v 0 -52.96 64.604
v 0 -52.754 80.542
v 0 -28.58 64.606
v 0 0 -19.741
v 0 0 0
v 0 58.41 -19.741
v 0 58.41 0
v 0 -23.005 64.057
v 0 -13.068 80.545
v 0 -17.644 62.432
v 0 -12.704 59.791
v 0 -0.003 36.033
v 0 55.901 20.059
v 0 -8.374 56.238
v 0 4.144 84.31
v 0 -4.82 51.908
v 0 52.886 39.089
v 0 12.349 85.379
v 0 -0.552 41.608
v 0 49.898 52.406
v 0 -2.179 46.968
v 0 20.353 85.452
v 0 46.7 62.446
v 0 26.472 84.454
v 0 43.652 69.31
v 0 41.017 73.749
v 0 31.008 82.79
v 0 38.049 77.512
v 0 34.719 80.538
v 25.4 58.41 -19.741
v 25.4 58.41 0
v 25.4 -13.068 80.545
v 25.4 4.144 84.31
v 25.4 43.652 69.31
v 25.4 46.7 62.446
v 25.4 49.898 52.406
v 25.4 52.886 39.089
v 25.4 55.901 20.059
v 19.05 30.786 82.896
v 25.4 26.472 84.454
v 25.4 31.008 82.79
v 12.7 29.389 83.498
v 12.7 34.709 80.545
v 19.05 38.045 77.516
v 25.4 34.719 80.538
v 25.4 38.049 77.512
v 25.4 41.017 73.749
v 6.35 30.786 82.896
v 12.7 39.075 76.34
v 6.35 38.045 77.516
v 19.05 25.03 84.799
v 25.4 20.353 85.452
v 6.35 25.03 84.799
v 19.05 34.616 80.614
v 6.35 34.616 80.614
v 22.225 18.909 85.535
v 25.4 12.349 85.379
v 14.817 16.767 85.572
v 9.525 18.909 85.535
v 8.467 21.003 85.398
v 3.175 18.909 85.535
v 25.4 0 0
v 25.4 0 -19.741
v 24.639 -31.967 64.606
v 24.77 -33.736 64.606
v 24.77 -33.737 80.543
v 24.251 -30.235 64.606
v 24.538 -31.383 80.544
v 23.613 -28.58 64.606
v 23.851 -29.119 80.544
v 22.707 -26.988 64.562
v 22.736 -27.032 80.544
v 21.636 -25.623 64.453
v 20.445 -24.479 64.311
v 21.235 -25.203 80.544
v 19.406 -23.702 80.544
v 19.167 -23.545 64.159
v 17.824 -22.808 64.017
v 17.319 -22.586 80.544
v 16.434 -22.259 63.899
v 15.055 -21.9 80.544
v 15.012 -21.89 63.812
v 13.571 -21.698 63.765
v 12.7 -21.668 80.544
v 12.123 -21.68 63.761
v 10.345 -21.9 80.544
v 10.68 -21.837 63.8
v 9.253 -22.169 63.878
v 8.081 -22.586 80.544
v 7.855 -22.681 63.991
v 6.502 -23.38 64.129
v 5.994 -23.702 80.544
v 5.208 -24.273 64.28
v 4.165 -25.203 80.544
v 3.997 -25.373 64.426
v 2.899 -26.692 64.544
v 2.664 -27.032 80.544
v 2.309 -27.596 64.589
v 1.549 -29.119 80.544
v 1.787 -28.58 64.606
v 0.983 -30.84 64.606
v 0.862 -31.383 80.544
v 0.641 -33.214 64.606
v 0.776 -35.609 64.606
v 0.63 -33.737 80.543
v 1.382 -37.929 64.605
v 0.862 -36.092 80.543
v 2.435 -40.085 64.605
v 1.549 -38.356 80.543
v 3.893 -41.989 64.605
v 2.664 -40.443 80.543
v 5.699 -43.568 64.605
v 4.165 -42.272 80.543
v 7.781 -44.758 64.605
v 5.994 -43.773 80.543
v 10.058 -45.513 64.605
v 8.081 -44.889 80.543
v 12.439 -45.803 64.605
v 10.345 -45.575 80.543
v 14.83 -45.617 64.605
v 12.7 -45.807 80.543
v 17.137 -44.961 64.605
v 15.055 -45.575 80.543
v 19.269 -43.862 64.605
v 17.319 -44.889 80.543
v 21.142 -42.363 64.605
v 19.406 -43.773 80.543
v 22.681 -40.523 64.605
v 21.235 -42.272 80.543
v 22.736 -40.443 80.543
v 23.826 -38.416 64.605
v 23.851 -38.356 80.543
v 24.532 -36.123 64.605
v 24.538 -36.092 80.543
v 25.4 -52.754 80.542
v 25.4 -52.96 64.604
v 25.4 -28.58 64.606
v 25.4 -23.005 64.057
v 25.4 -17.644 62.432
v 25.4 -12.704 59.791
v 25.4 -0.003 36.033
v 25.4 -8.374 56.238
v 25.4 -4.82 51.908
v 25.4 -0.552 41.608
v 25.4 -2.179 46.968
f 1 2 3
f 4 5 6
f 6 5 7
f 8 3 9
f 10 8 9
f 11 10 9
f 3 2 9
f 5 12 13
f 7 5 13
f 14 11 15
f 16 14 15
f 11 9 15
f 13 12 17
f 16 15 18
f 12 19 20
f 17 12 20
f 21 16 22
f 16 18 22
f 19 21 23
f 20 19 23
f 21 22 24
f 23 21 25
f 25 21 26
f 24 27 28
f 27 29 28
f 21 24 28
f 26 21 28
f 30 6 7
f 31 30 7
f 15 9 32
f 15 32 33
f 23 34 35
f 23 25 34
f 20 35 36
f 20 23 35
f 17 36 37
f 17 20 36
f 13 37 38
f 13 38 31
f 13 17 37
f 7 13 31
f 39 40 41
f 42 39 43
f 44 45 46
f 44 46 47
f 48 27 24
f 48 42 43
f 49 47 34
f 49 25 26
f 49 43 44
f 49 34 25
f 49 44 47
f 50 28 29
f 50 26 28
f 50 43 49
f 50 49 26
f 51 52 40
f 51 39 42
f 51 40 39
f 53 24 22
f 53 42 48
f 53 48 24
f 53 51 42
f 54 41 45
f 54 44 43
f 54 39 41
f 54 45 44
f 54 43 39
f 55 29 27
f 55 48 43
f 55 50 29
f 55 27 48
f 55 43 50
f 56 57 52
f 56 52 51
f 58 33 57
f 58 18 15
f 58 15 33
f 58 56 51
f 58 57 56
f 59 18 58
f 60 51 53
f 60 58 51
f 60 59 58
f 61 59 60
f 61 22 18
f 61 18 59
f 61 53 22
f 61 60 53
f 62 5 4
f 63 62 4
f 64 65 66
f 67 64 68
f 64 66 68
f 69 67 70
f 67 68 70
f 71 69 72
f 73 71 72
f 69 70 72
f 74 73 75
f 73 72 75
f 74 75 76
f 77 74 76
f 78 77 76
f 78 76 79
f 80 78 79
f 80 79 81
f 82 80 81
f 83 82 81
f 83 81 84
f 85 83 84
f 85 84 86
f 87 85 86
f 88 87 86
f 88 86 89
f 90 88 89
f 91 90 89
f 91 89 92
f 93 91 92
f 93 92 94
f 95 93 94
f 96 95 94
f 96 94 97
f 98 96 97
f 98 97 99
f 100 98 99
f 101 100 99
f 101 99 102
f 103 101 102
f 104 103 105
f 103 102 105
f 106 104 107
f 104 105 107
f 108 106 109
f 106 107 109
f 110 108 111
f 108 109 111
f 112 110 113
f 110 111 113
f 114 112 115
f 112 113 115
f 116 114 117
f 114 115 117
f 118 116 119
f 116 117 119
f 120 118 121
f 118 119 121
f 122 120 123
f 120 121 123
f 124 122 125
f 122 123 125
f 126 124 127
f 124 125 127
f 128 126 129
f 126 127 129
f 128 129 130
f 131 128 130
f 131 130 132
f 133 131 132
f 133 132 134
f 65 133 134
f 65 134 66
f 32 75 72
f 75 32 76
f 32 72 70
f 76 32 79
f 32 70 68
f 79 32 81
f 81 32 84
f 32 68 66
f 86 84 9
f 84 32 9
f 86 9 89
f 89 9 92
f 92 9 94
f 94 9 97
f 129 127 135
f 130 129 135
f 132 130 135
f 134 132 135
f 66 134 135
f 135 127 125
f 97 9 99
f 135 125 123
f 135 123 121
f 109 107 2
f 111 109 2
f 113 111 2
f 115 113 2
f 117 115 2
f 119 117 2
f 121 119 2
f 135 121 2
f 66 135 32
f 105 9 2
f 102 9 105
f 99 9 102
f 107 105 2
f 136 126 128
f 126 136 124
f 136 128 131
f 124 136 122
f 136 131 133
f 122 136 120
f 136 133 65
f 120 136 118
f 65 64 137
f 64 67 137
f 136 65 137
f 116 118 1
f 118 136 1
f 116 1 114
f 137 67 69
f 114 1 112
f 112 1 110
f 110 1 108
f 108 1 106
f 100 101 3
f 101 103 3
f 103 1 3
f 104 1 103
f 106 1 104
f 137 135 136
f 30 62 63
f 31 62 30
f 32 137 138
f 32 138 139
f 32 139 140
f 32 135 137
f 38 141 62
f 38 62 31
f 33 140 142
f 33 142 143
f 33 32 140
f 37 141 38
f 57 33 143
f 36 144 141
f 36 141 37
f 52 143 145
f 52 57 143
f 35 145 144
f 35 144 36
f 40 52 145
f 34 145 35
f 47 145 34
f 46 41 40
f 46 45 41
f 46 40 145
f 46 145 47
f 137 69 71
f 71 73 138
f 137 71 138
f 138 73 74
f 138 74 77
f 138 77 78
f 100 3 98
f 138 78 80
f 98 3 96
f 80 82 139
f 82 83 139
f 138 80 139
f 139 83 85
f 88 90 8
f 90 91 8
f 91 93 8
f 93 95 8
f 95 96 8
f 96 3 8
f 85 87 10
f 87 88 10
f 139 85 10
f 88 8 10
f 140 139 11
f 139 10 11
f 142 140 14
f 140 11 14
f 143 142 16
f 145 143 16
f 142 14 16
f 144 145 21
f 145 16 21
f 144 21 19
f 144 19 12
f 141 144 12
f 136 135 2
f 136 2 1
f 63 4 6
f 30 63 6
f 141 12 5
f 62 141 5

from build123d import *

# Parameters (mm, degrees)
F1_DEPTH = 25.4
F2_R     = 12.0698506183
F3_DEPTH = 100.2924419072


with BuildPart() as f1:
    # F0 (on Right) → F1 (new body)
    with BuildSketch(Plane.YZ):
        with BuildLine():
            Line((15.5100870162, 42.3829037865), (15.5131848078, 0))
            Line((15.5131848078, 0), (58.4104247391, 0))
            add(Edge.make_bspline(
                [(-13.0677023463, 80.5449451426), (5.0006115747, 84.8992469104), (47.0210201722, 95.025788891), (54.2753672082, 34.5002323585), (58.4104247391, 0)],
                knots=[0, 0, 0, 0, 0.4299890107, 1, 1, 1, 1], degree=3))
            ThreePointArc((-13.0677023463, 80.5449451426), (7.1384855982, 72.1769982749), (15.509386141, 51.9720337826))
            Line((15.509386141, 51.9720337826), (15.5100870162, 42.3829037865))
        make_face()
        with BuildLine():
            Line((58.4104247391, 0), (15.5131848078, 0))
            Line((15.5131848078, 0), (15.5100870162, 42.3829037865))
            Line((15.5100870162, 42.3829037865), (15.509386141, 51.9720337826))
            ThreePointArc((15.509386141, 51.9720337826), (7.1384855982, 72.1769982749), (-13.0677023463, 80.5449451426))
            Line((-13.0677023463, 80.5449451426), (-52.7544449859, 80.542044415))
            Line((-52.7544449859, 80.542044415), (-52.9602865575, 64.6042414004))
            Line((-52.9602865575, 64.6042414004), (-28.5797221689, 64.6060233903))
            ThreePointArc((-28.5797221689, 64.6060233903), (-8.3735342243, 56.2380765226), (-0.0026336815, 36.0331120303))
            Line((-0.0026336815, 36.0331120303), (0, 0))
            Line((0, 0), (0, -19.7412725538))
            Line((0, -19.7412725538), (58.4104247391, -19.7412725538))
            Line((58.4104247391, -19.7412725538), (58.4104247391, 0))
        make_face()
    extrude(amount=F1_DEPTH)

    # F2 (on face) → F3 (cut, through all)
    with BuildSketch(Plane(origin=(0, -0.0058871476, 80.5458998384), x_dir=(1, 0, 0), z_dir=(0, -7.30906e-05, 0.9999999973))):
        with Locations((12.6999961212, -33.7315686047)):
            Circle(F2_R)
    extrude(amount=-F3_DEPTH, mode=Mode.SUBTRACT)


solid = f1.part
